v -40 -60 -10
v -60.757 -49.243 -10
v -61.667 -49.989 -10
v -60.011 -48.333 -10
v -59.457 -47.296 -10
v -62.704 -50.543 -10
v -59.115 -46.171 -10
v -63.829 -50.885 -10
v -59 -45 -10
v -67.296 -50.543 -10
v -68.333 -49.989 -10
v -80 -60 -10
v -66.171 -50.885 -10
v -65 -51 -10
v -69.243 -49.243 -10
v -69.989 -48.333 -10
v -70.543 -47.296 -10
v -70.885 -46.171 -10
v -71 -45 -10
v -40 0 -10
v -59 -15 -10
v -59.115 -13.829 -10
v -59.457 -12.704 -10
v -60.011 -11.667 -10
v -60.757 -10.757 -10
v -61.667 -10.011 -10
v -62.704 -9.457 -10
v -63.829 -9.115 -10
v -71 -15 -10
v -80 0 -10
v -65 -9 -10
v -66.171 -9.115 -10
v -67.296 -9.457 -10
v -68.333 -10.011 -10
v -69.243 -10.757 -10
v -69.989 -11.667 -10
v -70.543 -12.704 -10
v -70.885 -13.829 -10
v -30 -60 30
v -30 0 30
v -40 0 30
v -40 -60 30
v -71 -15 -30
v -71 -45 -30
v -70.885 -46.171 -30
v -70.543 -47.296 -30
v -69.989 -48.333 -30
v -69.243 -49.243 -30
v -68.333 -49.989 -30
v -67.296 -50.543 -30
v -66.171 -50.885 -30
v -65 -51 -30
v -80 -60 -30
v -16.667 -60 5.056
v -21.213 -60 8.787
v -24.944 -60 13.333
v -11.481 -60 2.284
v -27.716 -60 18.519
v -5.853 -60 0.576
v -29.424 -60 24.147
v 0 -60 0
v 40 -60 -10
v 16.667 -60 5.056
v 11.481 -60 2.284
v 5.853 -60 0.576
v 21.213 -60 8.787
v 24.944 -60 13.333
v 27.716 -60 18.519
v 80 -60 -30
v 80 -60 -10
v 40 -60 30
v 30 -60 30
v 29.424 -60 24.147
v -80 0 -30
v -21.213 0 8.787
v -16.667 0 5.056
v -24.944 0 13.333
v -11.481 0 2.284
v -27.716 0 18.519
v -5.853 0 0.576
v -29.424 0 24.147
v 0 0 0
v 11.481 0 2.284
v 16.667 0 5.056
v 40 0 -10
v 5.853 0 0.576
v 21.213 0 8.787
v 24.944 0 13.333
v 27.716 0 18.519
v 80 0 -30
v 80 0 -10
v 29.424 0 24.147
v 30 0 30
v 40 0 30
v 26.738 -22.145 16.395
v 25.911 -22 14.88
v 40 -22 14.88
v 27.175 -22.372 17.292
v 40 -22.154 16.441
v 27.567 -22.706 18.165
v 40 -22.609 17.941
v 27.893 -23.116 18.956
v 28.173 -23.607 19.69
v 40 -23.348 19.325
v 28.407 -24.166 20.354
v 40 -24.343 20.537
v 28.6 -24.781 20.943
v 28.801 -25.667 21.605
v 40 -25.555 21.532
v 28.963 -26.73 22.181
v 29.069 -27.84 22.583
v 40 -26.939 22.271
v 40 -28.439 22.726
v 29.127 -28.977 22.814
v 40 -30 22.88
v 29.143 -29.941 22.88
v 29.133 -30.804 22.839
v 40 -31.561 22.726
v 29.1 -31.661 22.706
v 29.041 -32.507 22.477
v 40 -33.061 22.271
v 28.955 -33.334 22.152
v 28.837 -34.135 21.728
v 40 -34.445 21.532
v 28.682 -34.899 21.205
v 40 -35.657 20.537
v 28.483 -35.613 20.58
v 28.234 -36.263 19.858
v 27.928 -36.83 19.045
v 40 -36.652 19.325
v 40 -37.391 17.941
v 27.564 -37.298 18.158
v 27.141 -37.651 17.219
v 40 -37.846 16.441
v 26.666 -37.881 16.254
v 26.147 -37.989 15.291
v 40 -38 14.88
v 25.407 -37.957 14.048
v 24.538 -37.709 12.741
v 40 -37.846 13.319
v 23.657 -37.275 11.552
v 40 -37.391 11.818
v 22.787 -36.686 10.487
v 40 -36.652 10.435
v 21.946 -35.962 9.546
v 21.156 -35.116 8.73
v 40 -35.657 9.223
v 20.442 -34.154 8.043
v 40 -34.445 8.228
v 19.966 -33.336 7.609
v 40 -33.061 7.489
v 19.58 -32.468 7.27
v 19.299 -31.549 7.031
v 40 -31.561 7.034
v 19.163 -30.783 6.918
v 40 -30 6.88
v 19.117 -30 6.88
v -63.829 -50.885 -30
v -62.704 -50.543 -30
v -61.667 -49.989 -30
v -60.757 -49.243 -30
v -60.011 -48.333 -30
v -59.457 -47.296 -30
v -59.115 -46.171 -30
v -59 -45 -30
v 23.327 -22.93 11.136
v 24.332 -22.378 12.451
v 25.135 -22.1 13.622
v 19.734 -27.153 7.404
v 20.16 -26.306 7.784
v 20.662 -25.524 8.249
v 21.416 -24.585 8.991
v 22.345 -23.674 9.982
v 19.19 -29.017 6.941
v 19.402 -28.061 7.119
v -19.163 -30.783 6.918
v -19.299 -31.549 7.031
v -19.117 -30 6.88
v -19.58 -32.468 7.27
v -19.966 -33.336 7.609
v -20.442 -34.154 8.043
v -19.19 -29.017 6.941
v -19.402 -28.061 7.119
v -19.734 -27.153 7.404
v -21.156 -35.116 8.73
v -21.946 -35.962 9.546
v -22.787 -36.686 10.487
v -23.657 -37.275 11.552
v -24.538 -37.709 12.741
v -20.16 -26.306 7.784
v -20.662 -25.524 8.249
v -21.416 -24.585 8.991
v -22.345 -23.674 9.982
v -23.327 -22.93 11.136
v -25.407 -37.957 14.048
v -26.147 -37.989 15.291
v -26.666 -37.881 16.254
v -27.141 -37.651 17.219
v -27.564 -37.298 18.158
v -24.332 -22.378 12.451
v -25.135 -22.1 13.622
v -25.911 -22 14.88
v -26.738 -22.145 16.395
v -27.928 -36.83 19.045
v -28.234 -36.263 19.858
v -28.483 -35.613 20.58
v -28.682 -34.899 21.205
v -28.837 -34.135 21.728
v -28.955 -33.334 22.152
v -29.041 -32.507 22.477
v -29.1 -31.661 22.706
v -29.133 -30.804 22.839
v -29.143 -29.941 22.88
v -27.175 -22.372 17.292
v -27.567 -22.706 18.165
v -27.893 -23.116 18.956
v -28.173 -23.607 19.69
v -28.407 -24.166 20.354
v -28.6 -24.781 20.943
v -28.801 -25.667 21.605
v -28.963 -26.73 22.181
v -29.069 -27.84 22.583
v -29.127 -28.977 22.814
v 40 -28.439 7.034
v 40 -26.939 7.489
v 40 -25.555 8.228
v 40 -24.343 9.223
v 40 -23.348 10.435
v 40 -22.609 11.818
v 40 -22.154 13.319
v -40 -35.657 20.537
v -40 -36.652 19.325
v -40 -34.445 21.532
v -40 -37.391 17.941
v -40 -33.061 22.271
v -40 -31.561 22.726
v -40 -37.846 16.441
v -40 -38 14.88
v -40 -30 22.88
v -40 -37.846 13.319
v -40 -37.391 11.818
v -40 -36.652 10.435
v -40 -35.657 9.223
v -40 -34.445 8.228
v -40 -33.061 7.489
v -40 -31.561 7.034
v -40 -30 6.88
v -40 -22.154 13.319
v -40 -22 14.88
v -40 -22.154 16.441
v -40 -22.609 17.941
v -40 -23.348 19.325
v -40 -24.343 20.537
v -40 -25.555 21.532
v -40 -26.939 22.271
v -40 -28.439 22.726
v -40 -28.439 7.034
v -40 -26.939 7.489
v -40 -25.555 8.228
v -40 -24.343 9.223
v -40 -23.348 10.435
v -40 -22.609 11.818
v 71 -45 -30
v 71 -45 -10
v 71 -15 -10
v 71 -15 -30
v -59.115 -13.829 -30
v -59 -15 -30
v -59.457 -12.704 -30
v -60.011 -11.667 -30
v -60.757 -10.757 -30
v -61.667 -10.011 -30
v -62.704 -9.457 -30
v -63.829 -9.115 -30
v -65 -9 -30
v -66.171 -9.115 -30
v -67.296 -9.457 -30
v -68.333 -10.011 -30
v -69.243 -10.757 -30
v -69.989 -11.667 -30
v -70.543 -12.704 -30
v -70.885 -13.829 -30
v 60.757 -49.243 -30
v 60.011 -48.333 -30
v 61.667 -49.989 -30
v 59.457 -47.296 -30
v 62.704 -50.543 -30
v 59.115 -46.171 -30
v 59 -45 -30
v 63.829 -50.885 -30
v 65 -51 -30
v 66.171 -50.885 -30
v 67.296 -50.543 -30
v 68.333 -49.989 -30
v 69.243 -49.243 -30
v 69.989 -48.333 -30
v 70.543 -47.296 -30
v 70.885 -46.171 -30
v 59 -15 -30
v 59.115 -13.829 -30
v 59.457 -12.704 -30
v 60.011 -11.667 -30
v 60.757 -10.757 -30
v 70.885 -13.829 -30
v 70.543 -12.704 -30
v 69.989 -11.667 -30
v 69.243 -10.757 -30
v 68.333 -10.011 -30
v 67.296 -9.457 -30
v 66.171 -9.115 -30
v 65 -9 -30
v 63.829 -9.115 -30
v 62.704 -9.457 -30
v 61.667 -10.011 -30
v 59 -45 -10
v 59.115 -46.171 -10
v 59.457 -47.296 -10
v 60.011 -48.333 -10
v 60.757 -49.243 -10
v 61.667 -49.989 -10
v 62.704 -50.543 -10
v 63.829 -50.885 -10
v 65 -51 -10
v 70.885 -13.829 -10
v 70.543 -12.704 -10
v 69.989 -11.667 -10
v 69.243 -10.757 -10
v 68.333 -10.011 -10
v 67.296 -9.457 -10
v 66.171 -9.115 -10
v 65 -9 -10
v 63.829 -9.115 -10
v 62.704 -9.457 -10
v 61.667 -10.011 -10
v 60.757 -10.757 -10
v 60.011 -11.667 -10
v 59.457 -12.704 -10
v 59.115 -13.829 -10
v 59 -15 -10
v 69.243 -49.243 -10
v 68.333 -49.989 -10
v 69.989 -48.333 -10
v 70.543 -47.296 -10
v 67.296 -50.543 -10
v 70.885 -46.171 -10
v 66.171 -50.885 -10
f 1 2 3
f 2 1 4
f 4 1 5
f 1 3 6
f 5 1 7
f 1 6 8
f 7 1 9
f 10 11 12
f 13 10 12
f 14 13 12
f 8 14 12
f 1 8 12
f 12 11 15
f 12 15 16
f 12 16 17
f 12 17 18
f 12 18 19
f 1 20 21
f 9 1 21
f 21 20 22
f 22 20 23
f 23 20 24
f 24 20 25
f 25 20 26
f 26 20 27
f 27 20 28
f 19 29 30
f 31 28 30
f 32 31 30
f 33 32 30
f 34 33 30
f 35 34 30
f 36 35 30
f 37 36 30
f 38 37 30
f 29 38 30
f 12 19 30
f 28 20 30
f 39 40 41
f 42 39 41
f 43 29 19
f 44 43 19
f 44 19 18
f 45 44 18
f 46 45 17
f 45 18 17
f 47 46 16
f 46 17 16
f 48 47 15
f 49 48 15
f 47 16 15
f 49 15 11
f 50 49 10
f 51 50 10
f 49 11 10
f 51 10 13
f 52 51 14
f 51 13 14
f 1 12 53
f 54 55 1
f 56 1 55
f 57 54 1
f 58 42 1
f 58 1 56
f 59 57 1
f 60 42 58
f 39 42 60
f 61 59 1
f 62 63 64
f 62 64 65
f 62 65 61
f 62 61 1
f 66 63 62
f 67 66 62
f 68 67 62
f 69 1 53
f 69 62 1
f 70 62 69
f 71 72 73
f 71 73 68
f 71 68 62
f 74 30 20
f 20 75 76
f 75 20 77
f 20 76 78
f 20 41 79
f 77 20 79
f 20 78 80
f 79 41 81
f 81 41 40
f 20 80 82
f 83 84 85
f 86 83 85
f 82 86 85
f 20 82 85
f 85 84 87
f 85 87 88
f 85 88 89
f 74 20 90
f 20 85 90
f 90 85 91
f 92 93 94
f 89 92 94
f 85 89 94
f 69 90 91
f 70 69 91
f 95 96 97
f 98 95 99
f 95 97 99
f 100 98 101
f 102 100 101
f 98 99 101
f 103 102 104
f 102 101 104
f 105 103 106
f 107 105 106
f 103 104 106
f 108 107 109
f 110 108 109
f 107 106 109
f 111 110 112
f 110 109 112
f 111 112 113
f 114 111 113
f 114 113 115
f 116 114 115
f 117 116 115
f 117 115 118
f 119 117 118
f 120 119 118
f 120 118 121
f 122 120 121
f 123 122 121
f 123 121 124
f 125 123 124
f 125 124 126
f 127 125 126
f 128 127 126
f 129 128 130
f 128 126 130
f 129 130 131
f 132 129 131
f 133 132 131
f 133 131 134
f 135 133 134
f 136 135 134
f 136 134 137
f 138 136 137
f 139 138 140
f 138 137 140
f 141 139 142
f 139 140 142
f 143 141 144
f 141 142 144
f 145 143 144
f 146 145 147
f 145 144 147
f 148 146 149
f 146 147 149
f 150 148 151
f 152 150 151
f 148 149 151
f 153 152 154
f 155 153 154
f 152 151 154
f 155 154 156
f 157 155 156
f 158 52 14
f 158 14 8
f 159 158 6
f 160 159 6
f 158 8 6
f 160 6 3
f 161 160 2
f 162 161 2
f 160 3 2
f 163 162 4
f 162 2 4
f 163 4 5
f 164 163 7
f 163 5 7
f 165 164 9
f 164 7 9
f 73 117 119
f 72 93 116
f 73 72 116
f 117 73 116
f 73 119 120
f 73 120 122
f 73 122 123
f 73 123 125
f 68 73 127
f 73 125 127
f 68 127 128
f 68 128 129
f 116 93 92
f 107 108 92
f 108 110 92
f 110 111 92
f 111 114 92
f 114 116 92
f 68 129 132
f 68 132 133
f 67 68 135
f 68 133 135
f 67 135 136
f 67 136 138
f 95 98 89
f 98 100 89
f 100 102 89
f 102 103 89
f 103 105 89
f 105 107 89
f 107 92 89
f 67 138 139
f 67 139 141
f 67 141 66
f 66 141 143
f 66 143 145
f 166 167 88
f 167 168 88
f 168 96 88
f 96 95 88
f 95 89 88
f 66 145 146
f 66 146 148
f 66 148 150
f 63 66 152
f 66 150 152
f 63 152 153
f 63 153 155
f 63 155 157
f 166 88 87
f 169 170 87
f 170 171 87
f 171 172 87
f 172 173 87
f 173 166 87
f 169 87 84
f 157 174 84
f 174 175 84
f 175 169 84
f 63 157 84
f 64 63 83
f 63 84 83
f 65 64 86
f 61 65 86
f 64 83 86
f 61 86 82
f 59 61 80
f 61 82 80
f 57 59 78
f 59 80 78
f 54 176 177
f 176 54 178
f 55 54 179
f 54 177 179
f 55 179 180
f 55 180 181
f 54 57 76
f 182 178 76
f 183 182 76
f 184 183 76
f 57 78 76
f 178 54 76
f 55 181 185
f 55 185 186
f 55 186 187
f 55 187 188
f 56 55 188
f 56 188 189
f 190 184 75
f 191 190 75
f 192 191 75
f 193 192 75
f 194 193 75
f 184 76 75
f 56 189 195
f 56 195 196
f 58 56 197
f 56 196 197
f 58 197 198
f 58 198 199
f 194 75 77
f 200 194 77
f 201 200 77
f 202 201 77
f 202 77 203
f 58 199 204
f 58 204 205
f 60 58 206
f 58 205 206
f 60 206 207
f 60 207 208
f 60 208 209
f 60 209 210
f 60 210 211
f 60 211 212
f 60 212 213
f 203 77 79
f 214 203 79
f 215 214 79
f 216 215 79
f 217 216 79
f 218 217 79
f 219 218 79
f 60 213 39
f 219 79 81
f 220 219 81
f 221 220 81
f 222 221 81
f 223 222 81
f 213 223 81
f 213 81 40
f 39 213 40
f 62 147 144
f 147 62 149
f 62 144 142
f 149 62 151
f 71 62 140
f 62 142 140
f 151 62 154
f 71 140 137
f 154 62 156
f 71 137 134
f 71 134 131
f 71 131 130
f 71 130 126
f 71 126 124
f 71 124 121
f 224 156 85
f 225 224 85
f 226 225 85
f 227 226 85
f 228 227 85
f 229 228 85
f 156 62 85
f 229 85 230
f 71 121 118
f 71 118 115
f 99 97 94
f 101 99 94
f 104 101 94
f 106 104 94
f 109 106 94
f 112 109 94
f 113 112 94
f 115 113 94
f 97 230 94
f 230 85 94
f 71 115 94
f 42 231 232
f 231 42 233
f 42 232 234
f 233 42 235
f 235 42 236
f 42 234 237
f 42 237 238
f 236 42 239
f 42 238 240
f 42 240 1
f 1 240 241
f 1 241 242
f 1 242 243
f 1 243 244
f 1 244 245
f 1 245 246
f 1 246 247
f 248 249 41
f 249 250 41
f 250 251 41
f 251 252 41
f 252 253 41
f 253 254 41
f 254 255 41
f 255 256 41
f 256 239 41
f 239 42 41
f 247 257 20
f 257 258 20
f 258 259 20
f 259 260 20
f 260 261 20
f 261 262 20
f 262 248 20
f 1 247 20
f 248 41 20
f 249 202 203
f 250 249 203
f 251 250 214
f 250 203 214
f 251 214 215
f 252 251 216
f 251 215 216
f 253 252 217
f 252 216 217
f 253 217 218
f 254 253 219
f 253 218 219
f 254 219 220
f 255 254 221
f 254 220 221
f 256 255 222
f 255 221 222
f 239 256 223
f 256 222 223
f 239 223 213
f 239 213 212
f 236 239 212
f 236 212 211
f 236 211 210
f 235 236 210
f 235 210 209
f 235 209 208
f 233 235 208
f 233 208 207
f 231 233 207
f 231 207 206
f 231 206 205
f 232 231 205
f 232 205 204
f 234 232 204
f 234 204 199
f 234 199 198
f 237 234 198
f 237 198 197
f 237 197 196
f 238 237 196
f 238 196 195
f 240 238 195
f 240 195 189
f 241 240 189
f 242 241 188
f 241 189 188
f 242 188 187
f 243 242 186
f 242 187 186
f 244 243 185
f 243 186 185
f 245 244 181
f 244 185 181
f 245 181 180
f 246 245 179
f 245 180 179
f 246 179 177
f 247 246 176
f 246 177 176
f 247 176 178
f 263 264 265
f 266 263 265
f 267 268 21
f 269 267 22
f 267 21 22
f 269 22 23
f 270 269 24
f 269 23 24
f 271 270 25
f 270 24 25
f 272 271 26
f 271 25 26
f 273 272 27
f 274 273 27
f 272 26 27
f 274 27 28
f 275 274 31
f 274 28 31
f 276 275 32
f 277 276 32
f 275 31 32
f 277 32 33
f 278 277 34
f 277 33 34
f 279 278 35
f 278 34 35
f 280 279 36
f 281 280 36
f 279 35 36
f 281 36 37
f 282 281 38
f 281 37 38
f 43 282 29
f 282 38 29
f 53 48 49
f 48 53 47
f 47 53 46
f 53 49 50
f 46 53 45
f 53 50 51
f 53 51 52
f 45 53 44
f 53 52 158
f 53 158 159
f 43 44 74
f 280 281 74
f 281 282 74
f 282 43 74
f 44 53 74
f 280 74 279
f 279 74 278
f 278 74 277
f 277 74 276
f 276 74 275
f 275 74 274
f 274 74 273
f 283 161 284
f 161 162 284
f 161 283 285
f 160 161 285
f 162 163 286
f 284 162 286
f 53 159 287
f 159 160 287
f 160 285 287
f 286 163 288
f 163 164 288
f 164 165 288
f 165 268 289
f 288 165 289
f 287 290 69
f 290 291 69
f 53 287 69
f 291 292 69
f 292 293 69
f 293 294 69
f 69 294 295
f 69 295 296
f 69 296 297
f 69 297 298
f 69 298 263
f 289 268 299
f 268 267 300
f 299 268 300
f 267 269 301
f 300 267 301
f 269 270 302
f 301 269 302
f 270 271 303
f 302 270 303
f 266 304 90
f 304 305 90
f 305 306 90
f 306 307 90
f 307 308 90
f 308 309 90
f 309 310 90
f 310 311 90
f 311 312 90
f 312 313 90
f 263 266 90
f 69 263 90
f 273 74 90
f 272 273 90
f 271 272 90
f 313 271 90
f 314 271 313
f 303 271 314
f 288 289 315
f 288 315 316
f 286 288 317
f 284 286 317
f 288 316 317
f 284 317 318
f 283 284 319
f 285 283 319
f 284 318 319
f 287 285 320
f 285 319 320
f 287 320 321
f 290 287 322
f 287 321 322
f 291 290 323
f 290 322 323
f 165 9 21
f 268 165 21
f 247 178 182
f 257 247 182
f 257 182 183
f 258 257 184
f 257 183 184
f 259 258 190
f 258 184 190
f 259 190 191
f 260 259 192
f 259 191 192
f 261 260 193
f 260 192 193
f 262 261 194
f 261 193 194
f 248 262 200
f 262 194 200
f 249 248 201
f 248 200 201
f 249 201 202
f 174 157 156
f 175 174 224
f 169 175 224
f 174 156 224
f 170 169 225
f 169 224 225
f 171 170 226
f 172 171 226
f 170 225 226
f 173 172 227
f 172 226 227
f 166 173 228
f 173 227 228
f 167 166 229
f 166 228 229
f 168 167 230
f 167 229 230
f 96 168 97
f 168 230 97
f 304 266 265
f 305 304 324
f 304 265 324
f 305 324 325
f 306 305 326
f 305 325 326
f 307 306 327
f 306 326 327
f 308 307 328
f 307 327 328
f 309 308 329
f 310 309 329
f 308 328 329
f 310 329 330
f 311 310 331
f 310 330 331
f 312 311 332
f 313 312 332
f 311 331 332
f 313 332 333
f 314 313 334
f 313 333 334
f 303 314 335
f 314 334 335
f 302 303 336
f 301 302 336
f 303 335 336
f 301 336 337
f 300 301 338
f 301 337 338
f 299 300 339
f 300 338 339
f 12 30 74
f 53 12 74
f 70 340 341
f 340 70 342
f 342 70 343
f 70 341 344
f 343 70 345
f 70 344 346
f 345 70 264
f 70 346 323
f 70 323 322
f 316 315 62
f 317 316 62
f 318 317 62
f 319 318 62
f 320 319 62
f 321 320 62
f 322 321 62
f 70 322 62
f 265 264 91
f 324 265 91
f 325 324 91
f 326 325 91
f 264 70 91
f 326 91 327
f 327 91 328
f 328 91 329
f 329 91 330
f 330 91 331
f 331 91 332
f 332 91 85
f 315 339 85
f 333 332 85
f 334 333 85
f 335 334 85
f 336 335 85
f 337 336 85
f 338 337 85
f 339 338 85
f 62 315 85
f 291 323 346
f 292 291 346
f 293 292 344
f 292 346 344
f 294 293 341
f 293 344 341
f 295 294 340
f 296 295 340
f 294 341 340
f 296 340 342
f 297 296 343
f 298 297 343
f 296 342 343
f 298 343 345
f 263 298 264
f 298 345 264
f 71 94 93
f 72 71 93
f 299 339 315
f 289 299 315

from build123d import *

# Parameters (mm, degrees)
F1_DEPTH = 60
F3_DEPTH = 120.001
F5_DEPTH = 20.001


with BuildPart() as f1:
    # F0 (on Front) → F1 (new body)
    with BuildSketch(Plane.XZ):
        with BuildLine():
            Line((-80, -10), (-80, -30))
            Line((-80, -30), (80, -30))
            Line((80, -30), (80, -10))
            Line((80, -10), (40, -10))
            Line((40, -10), (40, 30))
            Line((40, 30), (30, 30))
            ThreePointArc((30, 30), (0, 0), (-30, 30))
            Line((-30, 30), (-40, 30))
            Line((-40, 30), (-40, -10))
            Line((-40, -10), (-80, -10))
        make_face()
    extrude(amount=F1_DEPTH)

    # F2 (on face) → F3 (cut, through all)
    with BuildSketch(Plane.YZ.offset(40)):
        with BuildLine():
            ThreePointArc((-30, 6.8799550533), (-24.3431457505, 9.2231008038), (-22, 14.8799550533))
            ThreePointArc((-22, 14.8799550533), (-35.6568542495, 20.5368093028), (-30, 6.8799550533))
        make_face()
    extrude(amount=-F3_DEPTH, mode=Mode.SUBTRACT)

    # F4 (on face) → F5 (cut, through all)
    with BuildSketch(Plane.XY.offset(-10)):
        with BuildLine():
            ThreePointArc((59, -45), (60.7573593129, -49.2426406871), (65, -51))
            Line((65, -51), (65, -45))
            Line((65, -45), (59, -45))
        make_face()
        with BuildLine():
            Line((65, -45), (65, -51))
            ThreePointArc((65, -51), (69.2426406871, -49.2426406871), (71, -45))
            Line((71, -45), (65, -45))
        make_face()
        with BuildLine():
            ThreePointArc((-71, -45), (-69.2426406871, -49.2426406871), (-65, -51))
            Line((-65, -51), (-65, -45))
            Line((-65, -45), (-71, -45))
        make_face()
        with BuildLine():
            Line((-65, -45), (-65, -51))
            ThreePointArc((-65, -51), (-60.7573593129, -49.2426406871), (-59, -45))
            Line((-59, -45), (-65, -45))
        make_face()
        with BuildLine():
            Line((-71, -45), (-65, -45))
            Line((-65, -45), (-65, -39))
            ThreePointArc((-65, -39), (-69.2426406871, -40.7573593129), (-71, -45))
        make_face()
        with BuildLine():
            Line((-65, -39), (-65, -45))
            Line((-65, -45), (-59, -45))
            ThreePointArc((-59, -45), (-60.7573593129, -40.7573593129), (-65, -39))
        make_face()
        with BuildLine():
            Line((-71, -15), (-71, -45))
            ThreePointArc((-71, -45), (-69.2426406871, -40.7573593129), (-65, -39))
            ThreePointArc((-65, -39), (-60.7573593129, -40.7573593129), (-59, -45))
            Line((-59, -45), (-59, -15))
            ThreePointArc((-59, -15), (-65, -21), (-71, -15))
        make_face()
        with BuildLine():
            Line((59, -45), (65, -45))
            Line((65, -45), (65, -39))
            ThreePointArc((65, -39), (60.7573593129, -40.7573593129), (59, -45))
        make_face()
        with BuildLine():
            Line((65, -39), (65, -45))
            Line((65, -45), (71, -45))
            ThreePointArc((71, -45), (69.2426406871, -40.7573593129), (65, -39))
        make_face()
        with BuildLine():
            Line((59, -15), (59, -45))
            ThreePointArc((59, -45), (60.7573593129, -40.7573593129), (65, -39))
            ThreePointArc((65, -39), (69.2426406871, -40.7573593129), (71, -45))
            Line((71, -45), (71, -15))
            ThreePointArc((71, -15), (65, -21), (59, -15))
        make_face()
        with BuildLine():
            ThreePointArc((-59, -15), (-65, -9), (-71, -15))
            Line((-71, -15), (-59, -15))
        make_face()
        with BuildLine():
            Line((-59, -15), (-71, -15))
            ThreePointArc((-71, -15), (-65, -21), (-59, -15))
        make_face()
        with BuildLine():
            ThreePointArc((71, -15), (65, -9), (59, -15))
            Line((59, -15), (71, -15))
        make_face()
        with BuildLine():
            Line((71, -15), (59, -15))
            ThreePointArc((59, -15), (65, -21), (71, -15))
        make_face()
    extrude(amount=-F5_DEPTH, mode=Mode.SUBTRACT)


solid = f1.part
